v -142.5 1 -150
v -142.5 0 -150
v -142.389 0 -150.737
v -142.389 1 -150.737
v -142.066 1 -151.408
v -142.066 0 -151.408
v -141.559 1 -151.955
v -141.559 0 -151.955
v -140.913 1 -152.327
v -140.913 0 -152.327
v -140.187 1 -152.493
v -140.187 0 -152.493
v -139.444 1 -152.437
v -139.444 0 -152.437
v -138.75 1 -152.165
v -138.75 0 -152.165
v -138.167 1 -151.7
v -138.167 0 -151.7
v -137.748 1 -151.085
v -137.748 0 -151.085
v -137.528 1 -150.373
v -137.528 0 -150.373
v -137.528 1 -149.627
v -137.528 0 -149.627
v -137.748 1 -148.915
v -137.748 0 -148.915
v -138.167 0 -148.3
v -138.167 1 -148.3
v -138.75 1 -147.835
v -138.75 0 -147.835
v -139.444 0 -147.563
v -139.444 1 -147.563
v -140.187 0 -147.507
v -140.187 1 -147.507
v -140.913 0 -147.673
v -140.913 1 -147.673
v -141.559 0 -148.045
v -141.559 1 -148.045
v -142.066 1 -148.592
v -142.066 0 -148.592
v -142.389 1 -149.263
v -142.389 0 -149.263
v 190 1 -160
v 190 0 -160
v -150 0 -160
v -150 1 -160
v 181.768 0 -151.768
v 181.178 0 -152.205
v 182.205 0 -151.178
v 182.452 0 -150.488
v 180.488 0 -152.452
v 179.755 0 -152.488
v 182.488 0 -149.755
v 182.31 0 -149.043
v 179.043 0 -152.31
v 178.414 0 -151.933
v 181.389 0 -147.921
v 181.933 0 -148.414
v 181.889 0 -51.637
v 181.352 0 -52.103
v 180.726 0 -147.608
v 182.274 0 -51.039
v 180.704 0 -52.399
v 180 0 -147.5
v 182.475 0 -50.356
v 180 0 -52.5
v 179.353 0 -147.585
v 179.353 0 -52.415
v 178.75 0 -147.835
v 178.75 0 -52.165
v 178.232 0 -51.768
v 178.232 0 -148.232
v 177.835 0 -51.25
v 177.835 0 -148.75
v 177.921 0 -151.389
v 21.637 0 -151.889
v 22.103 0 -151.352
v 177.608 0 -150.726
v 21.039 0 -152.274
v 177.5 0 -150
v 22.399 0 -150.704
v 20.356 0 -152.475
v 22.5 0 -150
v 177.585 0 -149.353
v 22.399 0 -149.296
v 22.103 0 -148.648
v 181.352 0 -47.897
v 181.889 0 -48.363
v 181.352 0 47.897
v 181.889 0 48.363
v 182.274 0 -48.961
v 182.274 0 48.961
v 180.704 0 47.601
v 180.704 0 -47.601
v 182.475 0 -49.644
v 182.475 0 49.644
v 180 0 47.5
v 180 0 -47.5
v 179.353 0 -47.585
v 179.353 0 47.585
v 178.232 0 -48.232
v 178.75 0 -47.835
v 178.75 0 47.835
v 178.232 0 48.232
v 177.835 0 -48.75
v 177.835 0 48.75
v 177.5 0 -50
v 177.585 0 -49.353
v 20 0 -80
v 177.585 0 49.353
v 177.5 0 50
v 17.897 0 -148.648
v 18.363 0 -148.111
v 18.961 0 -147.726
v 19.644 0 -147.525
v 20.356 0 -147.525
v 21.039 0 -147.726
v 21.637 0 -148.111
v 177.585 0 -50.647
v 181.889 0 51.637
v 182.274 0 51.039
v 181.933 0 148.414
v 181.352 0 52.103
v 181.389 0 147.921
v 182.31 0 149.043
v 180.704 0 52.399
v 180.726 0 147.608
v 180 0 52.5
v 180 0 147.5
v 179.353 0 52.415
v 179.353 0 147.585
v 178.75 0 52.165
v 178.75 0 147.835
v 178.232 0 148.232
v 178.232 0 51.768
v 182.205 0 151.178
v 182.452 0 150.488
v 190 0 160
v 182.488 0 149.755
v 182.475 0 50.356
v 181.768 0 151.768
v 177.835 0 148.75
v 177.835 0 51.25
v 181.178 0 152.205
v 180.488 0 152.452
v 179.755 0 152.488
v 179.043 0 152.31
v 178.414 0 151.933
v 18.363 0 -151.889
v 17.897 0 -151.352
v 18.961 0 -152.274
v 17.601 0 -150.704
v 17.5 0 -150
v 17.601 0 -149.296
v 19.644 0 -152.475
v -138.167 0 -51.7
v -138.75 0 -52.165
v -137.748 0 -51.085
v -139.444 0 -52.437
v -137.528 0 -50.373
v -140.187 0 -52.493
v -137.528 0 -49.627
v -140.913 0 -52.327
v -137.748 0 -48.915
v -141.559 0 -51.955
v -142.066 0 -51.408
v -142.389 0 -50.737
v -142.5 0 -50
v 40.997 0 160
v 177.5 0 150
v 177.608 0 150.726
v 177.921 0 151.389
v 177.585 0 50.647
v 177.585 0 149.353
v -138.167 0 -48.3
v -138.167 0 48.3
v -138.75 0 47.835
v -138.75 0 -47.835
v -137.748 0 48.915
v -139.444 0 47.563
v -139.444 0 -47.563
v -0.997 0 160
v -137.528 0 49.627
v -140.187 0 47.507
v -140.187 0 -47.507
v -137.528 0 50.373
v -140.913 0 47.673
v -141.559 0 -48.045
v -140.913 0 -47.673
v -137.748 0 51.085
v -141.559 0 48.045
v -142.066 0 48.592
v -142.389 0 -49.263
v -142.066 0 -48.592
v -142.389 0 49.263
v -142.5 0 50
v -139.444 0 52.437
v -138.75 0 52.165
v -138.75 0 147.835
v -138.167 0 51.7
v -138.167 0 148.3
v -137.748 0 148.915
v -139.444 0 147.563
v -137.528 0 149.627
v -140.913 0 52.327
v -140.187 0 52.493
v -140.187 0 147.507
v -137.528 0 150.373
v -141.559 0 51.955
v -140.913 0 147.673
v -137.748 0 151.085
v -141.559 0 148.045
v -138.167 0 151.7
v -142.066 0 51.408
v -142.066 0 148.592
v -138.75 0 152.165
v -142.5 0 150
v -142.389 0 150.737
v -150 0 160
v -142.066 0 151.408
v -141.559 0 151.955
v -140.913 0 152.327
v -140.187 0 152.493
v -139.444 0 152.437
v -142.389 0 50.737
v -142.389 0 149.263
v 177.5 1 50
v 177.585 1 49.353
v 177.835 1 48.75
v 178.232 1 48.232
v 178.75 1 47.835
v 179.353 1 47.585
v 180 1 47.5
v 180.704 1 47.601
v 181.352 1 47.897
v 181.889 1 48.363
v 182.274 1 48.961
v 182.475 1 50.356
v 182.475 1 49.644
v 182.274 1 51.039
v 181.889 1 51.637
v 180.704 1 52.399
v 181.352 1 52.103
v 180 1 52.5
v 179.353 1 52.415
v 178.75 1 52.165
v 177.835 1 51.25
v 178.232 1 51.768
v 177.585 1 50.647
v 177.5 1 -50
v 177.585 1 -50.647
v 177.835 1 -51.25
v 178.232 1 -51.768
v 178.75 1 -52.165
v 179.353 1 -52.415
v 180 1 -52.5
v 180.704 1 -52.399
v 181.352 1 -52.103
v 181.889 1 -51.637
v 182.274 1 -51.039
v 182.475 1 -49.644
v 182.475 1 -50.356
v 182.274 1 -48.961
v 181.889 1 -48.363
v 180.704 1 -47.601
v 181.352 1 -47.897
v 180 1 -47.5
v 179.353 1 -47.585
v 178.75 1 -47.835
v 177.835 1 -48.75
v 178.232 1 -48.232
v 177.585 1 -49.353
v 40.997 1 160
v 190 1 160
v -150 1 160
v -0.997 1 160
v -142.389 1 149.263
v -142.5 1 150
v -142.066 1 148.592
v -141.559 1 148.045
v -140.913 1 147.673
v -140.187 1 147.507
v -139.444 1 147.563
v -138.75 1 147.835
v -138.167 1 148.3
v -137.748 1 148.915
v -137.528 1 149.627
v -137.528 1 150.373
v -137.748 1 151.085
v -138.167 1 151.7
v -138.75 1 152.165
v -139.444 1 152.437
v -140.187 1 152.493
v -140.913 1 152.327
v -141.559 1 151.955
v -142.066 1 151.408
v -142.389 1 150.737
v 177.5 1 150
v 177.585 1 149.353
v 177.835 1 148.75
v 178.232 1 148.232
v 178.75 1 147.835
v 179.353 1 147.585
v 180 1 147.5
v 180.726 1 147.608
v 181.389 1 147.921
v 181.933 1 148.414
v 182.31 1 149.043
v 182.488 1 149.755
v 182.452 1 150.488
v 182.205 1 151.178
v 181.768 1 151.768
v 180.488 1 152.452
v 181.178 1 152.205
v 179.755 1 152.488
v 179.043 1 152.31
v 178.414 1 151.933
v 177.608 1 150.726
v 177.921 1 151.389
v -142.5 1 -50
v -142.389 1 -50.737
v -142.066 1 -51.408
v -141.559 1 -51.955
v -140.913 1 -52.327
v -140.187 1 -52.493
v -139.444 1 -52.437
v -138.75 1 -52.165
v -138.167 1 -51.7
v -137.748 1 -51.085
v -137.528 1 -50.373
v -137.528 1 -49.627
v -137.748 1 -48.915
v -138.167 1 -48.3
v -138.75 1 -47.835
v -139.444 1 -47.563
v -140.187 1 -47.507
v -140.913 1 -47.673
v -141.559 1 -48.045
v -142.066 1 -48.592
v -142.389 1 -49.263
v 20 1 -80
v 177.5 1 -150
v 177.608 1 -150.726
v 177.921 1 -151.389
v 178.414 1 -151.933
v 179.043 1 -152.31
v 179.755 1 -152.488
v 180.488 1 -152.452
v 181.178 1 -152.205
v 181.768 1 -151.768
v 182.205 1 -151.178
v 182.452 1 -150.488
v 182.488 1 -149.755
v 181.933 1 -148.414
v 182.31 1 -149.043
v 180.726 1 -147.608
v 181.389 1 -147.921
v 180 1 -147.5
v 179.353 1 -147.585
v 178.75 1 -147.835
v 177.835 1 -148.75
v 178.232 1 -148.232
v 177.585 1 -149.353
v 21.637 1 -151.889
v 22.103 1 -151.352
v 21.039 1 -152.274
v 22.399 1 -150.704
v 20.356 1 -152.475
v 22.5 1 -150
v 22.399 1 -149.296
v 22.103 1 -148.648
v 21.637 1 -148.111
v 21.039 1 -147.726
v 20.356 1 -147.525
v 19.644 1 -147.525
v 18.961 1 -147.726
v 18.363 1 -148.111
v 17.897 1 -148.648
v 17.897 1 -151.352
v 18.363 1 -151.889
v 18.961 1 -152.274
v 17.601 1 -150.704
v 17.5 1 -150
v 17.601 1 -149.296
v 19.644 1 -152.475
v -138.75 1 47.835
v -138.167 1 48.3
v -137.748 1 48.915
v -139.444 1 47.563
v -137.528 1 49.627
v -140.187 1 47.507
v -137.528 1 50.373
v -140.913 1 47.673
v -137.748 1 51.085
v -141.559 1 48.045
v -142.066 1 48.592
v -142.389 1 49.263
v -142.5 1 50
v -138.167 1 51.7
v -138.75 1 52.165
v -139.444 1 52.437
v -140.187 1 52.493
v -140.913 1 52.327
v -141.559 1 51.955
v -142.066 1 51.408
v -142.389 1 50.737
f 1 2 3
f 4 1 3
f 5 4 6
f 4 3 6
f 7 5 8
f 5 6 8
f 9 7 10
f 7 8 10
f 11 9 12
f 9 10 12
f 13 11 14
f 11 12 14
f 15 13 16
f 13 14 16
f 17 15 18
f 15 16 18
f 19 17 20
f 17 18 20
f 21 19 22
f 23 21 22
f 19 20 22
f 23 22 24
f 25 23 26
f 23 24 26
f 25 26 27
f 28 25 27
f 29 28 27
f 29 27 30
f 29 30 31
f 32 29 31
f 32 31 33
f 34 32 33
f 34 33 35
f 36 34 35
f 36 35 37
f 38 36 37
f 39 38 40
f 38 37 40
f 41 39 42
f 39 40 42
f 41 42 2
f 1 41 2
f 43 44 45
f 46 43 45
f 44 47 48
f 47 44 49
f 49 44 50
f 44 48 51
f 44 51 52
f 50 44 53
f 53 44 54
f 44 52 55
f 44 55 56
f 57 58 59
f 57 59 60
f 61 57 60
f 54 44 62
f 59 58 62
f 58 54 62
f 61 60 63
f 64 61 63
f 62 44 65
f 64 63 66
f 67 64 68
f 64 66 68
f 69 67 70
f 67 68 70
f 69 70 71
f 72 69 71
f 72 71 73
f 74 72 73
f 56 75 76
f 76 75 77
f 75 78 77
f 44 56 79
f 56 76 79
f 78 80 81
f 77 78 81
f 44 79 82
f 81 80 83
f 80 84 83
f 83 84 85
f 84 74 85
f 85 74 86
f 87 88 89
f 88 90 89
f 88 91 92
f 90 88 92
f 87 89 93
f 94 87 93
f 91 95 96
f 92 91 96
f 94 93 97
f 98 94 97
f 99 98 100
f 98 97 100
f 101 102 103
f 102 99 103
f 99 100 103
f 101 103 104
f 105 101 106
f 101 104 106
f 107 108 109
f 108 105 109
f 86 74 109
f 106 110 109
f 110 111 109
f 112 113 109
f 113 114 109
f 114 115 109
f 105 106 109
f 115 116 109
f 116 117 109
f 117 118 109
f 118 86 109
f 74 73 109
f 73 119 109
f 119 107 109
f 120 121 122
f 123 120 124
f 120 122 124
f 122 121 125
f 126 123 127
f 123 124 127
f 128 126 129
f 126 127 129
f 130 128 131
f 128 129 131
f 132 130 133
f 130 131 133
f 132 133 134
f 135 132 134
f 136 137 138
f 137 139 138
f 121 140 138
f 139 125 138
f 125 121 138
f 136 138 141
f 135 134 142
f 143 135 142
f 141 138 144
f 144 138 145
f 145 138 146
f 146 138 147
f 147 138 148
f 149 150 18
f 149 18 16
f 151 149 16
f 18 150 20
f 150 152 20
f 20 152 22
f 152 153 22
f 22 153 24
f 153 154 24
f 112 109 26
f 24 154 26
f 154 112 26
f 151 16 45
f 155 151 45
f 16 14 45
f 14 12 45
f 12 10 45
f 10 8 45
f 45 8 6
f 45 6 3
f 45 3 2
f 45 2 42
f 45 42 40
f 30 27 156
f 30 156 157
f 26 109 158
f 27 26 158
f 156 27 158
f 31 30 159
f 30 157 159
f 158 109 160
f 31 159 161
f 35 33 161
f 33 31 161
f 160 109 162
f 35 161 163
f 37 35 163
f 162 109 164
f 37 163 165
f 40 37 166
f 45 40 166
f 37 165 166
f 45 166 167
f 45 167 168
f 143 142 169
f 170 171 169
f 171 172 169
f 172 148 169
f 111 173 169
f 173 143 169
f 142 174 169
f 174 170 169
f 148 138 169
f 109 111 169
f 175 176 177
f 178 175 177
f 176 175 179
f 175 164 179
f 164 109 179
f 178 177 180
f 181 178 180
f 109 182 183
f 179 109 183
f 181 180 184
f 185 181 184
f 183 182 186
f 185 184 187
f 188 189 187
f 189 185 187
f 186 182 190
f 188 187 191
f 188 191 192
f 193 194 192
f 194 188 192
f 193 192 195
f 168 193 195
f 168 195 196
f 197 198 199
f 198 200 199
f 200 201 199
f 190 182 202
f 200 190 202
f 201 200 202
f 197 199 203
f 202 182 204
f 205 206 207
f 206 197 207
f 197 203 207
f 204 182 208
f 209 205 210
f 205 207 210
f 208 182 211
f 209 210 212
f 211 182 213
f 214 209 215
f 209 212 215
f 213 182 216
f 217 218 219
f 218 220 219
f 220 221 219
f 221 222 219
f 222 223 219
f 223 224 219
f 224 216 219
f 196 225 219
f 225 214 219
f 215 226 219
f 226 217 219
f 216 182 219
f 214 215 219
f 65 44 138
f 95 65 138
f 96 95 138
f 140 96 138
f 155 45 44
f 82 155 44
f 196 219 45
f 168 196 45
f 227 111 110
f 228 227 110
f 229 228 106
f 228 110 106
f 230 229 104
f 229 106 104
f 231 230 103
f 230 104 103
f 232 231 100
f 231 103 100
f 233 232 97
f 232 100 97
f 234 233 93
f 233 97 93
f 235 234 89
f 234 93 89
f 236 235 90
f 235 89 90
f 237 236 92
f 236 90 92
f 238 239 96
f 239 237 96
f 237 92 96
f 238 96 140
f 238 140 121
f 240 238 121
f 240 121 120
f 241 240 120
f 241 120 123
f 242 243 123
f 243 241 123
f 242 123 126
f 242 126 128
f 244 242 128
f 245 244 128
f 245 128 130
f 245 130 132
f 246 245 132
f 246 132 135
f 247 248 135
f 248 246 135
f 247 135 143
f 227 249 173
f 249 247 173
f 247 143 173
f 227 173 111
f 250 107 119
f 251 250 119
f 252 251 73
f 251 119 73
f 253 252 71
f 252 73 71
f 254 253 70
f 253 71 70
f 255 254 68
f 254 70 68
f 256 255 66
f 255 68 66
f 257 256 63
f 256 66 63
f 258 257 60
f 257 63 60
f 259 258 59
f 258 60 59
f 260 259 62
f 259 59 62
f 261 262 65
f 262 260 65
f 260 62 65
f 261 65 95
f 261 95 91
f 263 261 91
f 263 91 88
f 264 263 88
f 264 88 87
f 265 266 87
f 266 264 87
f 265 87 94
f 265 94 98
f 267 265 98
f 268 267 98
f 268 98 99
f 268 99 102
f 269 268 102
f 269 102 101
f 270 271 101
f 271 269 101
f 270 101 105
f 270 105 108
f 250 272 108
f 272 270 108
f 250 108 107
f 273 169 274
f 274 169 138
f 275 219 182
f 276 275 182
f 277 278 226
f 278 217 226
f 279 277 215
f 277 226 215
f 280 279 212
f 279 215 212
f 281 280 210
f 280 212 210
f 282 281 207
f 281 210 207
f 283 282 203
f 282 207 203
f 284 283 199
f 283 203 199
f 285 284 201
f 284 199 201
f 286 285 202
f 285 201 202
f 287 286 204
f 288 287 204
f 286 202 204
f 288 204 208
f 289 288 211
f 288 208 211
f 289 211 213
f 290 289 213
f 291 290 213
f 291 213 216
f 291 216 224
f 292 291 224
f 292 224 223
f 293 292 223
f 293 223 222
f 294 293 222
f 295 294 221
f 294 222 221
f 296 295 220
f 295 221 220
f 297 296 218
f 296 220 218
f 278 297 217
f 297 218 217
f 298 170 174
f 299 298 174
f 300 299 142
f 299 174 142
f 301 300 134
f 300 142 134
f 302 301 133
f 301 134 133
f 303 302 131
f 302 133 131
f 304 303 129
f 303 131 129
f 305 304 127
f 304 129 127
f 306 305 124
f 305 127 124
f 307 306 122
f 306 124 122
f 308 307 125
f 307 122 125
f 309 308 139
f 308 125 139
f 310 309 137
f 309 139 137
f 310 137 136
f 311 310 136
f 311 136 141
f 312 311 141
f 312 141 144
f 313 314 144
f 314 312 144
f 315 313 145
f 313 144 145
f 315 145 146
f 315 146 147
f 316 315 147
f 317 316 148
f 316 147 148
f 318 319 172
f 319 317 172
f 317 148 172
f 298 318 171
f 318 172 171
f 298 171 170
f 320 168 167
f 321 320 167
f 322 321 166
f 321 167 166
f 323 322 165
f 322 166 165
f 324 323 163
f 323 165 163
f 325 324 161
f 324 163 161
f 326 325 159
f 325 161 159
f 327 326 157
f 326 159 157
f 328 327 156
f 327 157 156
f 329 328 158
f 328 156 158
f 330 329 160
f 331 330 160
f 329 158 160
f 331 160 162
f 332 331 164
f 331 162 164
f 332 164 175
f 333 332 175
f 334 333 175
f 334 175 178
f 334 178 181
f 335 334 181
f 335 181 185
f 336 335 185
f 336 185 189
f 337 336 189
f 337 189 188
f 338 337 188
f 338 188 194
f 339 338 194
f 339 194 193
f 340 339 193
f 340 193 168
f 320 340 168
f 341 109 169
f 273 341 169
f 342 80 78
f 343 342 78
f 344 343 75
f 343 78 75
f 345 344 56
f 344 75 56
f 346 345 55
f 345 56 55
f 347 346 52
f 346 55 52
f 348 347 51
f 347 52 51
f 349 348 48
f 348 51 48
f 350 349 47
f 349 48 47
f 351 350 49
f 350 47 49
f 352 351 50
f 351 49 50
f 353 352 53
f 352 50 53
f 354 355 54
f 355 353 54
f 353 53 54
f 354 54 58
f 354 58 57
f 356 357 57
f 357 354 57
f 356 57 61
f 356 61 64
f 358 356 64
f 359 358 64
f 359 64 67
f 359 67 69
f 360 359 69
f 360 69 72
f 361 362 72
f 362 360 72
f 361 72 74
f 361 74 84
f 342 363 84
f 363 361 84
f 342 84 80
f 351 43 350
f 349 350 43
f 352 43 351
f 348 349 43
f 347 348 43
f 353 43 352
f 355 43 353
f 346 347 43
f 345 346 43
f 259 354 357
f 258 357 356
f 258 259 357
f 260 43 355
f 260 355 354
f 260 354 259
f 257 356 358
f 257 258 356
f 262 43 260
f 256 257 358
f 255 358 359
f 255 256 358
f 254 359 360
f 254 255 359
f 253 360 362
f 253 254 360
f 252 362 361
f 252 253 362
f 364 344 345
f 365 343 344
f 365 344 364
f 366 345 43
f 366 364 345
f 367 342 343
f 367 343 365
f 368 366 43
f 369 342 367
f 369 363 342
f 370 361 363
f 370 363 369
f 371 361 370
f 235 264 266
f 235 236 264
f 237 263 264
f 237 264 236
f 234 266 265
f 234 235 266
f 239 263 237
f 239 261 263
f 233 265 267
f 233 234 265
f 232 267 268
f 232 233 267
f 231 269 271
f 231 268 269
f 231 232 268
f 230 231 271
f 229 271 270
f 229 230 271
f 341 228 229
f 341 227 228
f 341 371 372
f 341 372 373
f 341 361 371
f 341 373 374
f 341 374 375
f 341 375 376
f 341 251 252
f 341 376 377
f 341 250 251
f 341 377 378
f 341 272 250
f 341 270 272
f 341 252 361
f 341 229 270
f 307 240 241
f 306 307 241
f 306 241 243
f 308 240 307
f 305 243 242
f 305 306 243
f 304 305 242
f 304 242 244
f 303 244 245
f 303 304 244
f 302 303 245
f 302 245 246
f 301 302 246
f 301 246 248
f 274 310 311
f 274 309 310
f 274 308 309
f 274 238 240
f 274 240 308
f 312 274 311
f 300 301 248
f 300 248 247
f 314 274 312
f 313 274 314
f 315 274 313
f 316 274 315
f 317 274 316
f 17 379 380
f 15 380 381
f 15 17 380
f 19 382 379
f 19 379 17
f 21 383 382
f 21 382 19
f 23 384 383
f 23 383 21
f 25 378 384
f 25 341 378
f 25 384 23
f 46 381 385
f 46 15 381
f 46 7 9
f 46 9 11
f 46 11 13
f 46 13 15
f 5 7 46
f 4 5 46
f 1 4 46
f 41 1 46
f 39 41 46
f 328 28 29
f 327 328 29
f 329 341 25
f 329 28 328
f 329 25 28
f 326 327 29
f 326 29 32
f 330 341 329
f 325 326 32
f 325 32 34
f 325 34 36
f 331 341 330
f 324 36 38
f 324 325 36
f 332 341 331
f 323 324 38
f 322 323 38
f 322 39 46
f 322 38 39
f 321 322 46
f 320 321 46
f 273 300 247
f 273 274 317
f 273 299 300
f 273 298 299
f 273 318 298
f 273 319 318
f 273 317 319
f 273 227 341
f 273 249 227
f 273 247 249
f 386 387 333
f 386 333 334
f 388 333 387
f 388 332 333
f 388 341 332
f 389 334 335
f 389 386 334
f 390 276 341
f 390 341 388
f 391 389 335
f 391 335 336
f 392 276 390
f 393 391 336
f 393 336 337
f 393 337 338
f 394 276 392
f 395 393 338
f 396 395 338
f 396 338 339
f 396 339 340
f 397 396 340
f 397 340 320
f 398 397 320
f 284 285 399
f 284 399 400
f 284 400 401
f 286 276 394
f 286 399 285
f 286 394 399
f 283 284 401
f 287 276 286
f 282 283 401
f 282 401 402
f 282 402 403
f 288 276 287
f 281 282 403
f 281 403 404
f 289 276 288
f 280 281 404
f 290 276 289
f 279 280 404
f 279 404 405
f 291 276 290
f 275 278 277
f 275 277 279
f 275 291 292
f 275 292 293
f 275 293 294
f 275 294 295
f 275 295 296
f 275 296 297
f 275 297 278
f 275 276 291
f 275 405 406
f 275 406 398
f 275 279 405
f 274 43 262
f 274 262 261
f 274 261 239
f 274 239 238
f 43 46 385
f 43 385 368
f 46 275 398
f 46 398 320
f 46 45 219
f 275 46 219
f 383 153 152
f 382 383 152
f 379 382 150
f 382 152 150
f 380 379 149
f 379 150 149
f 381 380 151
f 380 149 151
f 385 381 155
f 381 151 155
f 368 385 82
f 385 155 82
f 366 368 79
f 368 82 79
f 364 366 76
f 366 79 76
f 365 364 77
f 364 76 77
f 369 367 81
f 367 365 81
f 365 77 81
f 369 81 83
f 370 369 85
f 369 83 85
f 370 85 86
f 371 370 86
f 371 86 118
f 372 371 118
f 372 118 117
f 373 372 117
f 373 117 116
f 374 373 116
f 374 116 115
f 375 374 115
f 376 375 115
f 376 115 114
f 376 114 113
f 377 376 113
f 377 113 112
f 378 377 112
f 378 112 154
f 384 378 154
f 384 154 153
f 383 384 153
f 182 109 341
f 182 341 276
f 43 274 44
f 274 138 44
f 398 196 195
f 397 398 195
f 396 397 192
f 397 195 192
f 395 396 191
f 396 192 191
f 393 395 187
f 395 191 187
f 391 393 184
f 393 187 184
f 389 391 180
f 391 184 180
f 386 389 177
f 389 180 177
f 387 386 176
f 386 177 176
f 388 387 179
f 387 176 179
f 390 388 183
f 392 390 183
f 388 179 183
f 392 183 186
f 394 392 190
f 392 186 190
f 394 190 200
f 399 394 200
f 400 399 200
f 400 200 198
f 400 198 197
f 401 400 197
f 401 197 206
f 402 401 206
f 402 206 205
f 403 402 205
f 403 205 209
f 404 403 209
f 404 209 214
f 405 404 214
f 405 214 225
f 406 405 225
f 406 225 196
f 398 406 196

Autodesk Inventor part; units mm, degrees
ref_plane "YZ Plane" through (0, 0, 0) normal (1, 0, 0) x (0, 1, 0)
ref_plane "XZ Plane" through (0, 0, 0) normal (0, 1, 0) x (-1, 0, 0)
ref_plane "XY Plane" through (0, 0, 0) normal (0, 0, 1) x (1, 0, 0)
sketch "Sketch1" plane through (0, 0, 0) normal (0, 1, 0) x (-1, 0, 0)
  line L0 (150, 160) -> (-190, 160)
  line L1 (-190, 160) -> (-190, -160)
  line L2 (-190, -160) -> (150, -160)
  line L3 (150, -160) -> (150, 160)
  line L4 (-20, -80) -> (0.9973, 160)
  line L5 (-20, -80) -> (220.9168, -80) construction
  line L6 (-20, -80) -> (-40.9973, 160)
  line L7 (140, -150) -> (-180, -150)
  line L8 (-180, -150) -> (-180, 150)
  line L9 (140, 150) -> (140, -150)
  circle A0 centre (140, 150) radius 2.5
  circle A1 centre (-180, 150) radius 2.5
  line L10 (140, 160) -> (140, 50)
  line L11 (140, 50) -> (140, -50)
  circle A2 centre (140, 50) radius 2.5
  circle A3 centre (140, -50) radius 2.5
  circle A4 centre (140, -150) radius 2.5
  circle A5 centre (-180, 50) radius 2.5
  circle A6 centre (-180, -50) radius 2.5
  circle A7 centre (-180, -150) radius 2.5
  circle A8 centre (-20, -150) radius 2.5
  line L12 (150, -150) -> (140, -150)
  line L13 (-20, -150) -> (-20, -80)
  point P0 (0, 0)
  point P1 (-40.9973, 160)
  dimension "d0" = 340
  dimension "d1" = 320
  dimension "d2" = 85
  dimension "d3" = 10
  dimension "d4" = 5
  dimension "d5" = 5
  dimension "d6" = 110
  dimension "d7" = 100
  dimension "d8" = 5
  dimension "d9" = 5
  dimension "d10" = 5
  dimension "d11" = 5
  dimension "d14" = 10
extrude "Extrusion1" add sketch "Sketch1" along normal blind 1 contours L3 L12 A4 L9 A3 A2 A0 L10 L0 | L10 A0 L9 A2 A3 A4 L7 A8 L13 L4 L0 | L3 L2 L1 L0 L6 L13 A8 L7 A4 L12
properties part number "PuertaCuero"
